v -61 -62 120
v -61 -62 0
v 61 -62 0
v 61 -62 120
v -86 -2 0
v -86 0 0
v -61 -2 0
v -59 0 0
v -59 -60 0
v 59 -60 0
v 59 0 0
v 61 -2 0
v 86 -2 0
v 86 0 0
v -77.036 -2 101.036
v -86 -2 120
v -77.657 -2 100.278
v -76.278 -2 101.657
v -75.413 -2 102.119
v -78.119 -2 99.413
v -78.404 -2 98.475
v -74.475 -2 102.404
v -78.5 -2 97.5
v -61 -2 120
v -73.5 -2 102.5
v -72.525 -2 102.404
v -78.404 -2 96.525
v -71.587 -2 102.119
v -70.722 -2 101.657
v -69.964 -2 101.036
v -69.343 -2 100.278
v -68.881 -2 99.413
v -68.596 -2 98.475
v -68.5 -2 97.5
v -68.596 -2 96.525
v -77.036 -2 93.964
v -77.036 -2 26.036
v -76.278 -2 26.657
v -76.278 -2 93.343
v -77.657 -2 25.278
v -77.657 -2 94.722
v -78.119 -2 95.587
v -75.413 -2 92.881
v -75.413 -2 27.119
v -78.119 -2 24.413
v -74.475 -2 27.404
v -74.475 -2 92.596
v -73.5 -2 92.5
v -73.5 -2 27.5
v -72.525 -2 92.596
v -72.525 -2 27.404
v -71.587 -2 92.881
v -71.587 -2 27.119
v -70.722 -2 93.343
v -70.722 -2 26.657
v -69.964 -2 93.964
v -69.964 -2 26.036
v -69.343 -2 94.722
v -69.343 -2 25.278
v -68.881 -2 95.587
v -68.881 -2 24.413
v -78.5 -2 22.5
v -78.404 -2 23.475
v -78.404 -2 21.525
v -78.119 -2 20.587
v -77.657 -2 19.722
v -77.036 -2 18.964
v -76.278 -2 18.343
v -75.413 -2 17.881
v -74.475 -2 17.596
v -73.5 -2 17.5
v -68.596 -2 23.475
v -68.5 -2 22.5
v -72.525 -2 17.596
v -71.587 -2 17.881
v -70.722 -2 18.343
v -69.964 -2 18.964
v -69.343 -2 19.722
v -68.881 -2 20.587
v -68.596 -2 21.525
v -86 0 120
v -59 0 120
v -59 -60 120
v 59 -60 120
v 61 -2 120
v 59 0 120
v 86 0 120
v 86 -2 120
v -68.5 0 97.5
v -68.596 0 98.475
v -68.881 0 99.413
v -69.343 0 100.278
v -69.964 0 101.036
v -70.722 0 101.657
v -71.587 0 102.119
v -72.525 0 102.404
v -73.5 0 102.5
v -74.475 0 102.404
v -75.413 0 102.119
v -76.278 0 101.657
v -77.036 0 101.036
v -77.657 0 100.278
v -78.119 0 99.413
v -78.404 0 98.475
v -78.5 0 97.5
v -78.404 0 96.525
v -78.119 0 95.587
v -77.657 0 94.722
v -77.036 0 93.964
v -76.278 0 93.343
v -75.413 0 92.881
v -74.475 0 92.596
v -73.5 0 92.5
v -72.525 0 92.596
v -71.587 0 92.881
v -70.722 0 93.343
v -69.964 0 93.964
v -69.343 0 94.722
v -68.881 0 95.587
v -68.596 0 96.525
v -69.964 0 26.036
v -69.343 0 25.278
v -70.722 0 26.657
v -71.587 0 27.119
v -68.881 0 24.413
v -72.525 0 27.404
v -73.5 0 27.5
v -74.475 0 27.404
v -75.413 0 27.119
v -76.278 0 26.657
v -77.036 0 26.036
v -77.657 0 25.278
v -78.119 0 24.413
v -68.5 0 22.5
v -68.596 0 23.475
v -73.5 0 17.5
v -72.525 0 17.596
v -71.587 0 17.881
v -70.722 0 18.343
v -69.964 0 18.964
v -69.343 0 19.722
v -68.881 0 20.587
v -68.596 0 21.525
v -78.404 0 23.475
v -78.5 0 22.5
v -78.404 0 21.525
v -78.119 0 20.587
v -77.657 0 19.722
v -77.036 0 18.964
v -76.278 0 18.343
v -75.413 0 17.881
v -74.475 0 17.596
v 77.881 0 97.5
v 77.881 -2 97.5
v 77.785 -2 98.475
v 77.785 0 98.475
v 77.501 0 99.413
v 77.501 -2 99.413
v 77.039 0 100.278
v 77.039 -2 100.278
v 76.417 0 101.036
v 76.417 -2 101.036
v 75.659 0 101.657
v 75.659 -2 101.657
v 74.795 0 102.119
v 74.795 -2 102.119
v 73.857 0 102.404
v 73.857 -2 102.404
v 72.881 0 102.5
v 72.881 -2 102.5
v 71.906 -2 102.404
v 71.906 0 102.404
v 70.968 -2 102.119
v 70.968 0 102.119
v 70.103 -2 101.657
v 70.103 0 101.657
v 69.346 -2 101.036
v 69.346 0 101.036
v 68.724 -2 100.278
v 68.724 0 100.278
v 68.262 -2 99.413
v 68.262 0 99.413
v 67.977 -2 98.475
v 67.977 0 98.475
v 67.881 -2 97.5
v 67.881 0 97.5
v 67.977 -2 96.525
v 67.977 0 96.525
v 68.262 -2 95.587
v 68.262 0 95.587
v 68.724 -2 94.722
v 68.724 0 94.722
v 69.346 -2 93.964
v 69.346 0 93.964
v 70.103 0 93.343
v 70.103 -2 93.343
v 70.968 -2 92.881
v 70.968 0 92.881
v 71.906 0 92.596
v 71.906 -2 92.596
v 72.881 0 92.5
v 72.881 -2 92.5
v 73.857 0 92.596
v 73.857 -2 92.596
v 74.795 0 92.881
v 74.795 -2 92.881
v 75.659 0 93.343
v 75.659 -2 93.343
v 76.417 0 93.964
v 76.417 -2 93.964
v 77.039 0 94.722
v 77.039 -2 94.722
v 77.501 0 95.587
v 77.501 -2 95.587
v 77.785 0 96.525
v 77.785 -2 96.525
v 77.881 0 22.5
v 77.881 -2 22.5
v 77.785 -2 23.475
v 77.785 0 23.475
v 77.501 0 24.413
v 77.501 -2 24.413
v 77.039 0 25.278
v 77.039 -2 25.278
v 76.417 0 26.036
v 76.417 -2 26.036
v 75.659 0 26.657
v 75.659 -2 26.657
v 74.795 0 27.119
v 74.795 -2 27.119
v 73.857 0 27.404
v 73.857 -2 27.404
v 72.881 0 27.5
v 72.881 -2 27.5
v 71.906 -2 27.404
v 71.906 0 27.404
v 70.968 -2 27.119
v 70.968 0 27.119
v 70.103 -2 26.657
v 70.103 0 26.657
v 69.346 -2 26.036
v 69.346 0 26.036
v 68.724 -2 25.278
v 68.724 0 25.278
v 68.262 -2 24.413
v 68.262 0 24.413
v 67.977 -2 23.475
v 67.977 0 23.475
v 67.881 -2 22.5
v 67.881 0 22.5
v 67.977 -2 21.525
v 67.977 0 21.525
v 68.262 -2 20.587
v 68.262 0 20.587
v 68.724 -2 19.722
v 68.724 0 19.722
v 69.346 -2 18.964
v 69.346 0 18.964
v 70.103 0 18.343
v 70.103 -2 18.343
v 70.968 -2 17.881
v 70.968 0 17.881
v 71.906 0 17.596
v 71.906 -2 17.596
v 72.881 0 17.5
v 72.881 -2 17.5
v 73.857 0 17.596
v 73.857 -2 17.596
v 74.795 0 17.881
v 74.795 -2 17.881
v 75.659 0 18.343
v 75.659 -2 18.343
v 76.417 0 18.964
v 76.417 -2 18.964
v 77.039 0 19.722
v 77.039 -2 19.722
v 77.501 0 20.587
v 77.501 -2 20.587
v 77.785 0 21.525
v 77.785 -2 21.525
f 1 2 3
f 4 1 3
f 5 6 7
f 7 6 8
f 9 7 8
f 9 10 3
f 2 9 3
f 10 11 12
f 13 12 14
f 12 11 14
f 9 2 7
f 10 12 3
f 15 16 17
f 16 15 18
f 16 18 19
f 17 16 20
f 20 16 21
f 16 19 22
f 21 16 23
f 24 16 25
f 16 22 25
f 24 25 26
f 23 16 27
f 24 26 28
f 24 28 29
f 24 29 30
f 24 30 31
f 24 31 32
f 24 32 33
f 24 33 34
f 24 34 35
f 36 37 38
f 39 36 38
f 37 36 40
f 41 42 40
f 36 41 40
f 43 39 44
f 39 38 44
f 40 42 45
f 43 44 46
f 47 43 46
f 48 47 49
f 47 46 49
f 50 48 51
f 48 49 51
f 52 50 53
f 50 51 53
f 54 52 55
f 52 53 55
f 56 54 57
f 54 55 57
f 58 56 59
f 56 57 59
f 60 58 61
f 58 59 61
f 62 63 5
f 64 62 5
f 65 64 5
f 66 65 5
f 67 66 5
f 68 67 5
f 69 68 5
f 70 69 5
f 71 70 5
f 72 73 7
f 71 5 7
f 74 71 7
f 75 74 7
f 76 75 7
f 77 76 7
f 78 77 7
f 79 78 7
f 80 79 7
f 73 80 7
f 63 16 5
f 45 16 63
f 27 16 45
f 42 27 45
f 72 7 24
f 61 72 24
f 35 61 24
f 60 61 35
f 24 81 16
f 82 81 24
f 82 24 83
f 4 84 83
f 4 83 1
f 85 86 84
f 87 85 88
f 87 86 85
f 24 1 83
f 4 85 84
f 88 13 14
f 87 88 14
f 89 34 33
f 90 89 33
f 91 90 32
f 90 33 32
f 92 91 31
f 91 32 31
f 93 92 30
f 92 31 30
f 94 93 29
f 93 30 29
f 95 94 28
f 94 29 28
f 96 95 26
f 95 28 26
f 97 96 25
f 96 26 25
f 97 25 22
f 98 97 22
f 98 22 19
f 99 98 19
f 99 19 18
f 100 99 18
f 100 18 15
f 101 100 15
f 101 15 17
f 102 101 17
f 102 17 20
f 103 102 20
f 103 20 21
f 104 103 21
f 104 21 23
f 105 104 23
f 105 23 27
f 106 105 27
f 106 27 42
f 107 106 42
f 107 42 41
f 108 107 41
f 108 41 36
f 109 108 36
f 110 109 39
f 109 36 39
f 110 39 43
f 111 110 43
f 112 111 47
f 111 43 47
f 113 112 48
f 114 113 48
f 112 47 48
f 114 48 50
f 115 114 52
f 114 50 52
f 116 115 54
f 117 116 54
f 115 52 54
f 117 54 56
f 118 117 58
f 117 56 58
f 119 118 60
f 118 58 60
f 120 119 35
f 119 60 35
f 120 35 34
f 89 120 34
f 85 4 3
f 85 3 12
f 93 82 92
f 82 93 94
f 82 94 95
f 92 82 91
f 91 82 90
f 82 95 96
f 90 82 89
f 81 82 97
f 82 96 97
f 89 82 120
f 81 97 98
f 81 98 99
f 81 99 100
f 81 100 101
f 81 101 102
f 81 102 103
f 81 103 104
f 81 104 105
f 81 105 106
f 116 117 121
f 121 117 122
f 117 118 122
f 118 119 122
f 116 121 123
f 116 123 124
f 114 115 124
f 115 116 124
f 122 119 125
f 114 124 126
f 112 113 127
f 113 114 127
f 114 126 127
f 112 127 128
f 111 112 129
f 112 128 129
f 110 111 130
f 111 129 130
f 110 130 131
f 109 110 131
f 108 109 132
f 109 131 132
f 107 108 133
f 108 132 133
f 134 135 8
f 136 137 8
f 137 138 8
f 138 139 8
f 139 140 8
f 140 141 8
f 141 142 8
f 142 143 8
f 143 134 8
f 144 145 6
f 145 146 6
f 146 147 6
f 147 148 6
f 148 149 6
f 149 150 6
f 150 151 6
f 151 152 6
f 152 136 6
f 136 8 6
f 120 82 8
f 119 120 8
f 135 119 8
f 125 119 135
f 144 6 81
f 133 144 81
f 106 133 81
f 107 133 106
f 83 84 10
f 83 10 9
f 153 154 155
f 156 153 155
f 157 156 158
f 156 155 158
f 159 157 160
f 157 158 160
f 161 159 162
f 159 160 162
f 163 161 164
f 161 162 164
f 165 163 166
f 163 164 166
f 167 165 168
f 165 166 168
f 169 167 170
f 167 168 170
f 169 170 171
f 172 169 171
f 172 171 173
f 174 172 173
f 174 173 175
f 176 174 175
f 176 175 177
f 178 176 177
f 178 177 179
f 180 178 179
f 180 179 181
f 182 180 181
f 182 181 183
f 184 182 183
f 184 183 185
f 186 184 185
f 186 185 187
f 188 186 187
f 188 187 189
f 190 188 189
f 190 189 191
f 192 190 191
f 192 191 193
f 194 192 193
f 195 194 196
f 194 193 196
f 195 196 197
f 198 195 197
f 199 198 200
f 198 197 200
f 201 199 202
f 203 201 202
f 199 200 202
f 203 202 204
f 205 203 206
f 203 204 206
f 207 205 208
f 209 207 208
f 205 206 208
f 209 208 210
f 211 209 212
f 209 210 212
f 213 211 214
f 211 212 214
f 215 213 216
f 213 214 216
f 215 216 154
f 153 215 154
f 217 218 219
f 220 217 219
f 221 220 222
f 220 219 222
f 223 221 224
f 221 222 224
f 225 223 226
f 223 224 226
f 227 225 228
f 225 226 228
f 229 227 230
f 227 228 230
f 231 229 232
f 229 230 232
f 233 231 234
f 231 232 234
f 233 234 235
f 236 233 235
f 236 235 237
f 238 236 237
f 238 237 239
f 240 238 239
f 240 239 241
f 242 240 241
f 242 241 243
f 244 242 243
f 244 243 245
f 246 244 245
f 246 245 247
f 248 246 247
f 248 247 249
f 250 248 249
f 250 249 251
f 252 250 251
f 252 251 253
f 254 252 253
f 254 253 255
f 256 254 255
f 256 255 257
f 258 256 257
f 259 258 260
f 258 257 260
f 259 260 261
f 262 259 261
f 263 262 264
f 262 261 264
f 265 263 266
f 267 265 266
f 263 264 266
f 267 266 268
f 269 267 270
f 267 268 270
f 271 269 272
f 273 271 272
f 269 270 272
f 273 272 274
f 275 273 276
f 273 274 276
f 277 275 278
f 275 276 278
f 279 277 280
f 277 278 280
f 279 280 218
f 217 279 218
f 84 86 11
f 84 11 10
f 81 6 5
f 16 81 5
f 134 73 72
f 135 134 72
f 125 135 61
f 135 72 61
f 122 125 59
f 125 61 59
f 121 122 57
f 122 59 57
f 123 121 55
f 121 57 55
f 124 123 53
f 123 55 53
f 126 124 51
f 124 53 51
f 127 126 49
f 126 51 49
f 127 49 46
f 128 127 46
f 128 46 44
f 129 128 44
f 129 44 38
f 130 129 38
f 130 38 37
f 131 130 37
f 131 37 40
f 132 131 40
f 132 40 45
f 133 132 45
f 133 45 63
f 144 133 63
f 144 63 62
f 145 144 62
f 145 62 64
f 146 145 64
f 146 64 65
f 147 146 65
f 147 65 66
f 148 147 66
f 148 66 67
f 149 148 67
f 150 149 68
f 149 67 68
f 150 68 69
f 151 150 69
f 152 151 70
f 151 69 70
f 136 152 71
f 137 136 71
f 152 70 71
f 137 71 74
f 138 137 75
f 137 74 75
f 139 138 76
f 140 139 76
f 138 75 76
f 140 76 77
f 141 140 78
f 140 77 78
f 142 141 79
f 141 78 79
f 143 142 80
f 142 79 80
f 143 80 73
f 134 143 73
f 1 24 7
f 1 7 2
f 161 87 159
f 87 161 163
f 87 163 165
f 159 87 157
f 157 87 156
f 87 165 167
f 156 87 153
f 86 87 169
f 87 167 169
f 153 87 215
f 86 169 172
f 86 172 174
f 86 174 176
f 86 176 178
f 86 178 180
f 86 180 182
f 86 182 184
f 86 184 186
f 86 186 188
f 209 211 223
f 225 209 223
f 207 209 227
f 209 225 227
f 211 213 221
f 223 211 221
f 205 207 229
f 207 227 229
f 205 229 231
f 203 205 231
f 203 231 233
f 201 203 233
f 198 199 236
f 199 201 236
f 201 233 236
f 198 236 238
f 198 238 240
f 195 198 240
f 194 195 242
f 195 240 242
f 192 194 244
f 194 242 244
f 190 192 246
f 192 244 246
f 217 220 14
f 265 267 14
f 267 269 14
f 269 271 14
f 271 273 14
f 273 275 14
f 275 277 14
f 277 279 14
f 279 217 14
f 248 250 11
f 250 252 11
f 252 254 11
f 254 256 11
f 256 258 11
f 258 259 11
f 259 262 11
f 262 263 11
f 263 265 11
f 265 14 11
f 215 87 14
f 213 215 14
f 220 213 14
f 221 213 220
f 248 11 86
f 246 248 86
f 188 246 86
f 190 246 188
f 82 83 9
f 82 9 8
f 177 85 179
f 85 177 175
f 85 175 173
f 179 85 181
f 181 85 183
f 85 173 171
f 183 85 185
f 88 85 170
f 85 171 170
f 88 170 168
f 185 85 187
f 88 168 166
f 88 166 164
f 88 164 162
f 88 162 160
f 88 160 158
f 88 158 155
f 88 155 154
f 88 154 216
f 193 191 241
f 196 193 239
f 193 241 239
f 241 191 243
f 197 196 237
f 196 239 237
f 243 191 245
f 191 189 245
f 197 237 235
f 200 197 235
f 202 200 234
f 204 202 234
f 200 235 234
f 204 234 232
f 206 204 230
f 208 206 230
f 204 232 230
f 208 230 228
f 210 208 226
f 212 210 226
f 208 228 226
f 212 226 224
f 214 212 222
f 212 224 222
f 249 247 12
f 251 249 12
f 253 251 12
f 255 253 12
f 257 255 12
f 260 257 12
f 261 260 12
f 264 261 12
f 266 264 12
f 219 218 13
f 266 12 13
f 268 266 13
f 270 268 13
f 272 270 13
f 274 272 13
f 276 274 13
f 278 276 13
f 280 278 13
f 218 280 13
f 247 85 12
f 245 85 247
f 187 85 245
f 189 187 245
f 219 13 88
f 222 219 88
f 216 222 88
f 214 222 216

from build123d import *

# Parameters (mm, degrees)
F1_DEPTH = 120
F2_R     = 5
F3_DEPTH = 25
F4_R     = 5
F5_DEPTH = 25


with BuildPart() as f1:
    # F0 (on Top) → F1 (new body)
    with BuildSketch(Plane.XY):
        Polygon((-59, 0), (-86, 0), (-86, -2), (-61, -2), (-61, -62), (61, -62), (61, -2), (86, -2), (86, 0), (59, 0), (59, -60), (-59, -60), align=None)
    extrude(amount=F1_DEPTH)

    # F2 (on face) → F3 (cut)
    with BuildSketch(Plane.XZ.offset(2)):
        with Locations((-73.5, 97.5)):
            Circle(F2_R)
        with Locations((-73.5, 22.5)):
            Circle(F2_R)
    extrude(amount=-F3_DEPTH, mode=Mode.SUBTRACT)

    # F4 (on face) → F5 (cut)
    with BuildSketch(Plane.XZ.offset(2)):
        with Locations((72.881177, 97.5)):
            Circle(F4_R)
        with Locations((72.881177, 22.5)):
            Circle(F4_R)
    extrude(amount=-F5_DEPTH, mode=Mode.SUBTRACT)


solid = f1.part
